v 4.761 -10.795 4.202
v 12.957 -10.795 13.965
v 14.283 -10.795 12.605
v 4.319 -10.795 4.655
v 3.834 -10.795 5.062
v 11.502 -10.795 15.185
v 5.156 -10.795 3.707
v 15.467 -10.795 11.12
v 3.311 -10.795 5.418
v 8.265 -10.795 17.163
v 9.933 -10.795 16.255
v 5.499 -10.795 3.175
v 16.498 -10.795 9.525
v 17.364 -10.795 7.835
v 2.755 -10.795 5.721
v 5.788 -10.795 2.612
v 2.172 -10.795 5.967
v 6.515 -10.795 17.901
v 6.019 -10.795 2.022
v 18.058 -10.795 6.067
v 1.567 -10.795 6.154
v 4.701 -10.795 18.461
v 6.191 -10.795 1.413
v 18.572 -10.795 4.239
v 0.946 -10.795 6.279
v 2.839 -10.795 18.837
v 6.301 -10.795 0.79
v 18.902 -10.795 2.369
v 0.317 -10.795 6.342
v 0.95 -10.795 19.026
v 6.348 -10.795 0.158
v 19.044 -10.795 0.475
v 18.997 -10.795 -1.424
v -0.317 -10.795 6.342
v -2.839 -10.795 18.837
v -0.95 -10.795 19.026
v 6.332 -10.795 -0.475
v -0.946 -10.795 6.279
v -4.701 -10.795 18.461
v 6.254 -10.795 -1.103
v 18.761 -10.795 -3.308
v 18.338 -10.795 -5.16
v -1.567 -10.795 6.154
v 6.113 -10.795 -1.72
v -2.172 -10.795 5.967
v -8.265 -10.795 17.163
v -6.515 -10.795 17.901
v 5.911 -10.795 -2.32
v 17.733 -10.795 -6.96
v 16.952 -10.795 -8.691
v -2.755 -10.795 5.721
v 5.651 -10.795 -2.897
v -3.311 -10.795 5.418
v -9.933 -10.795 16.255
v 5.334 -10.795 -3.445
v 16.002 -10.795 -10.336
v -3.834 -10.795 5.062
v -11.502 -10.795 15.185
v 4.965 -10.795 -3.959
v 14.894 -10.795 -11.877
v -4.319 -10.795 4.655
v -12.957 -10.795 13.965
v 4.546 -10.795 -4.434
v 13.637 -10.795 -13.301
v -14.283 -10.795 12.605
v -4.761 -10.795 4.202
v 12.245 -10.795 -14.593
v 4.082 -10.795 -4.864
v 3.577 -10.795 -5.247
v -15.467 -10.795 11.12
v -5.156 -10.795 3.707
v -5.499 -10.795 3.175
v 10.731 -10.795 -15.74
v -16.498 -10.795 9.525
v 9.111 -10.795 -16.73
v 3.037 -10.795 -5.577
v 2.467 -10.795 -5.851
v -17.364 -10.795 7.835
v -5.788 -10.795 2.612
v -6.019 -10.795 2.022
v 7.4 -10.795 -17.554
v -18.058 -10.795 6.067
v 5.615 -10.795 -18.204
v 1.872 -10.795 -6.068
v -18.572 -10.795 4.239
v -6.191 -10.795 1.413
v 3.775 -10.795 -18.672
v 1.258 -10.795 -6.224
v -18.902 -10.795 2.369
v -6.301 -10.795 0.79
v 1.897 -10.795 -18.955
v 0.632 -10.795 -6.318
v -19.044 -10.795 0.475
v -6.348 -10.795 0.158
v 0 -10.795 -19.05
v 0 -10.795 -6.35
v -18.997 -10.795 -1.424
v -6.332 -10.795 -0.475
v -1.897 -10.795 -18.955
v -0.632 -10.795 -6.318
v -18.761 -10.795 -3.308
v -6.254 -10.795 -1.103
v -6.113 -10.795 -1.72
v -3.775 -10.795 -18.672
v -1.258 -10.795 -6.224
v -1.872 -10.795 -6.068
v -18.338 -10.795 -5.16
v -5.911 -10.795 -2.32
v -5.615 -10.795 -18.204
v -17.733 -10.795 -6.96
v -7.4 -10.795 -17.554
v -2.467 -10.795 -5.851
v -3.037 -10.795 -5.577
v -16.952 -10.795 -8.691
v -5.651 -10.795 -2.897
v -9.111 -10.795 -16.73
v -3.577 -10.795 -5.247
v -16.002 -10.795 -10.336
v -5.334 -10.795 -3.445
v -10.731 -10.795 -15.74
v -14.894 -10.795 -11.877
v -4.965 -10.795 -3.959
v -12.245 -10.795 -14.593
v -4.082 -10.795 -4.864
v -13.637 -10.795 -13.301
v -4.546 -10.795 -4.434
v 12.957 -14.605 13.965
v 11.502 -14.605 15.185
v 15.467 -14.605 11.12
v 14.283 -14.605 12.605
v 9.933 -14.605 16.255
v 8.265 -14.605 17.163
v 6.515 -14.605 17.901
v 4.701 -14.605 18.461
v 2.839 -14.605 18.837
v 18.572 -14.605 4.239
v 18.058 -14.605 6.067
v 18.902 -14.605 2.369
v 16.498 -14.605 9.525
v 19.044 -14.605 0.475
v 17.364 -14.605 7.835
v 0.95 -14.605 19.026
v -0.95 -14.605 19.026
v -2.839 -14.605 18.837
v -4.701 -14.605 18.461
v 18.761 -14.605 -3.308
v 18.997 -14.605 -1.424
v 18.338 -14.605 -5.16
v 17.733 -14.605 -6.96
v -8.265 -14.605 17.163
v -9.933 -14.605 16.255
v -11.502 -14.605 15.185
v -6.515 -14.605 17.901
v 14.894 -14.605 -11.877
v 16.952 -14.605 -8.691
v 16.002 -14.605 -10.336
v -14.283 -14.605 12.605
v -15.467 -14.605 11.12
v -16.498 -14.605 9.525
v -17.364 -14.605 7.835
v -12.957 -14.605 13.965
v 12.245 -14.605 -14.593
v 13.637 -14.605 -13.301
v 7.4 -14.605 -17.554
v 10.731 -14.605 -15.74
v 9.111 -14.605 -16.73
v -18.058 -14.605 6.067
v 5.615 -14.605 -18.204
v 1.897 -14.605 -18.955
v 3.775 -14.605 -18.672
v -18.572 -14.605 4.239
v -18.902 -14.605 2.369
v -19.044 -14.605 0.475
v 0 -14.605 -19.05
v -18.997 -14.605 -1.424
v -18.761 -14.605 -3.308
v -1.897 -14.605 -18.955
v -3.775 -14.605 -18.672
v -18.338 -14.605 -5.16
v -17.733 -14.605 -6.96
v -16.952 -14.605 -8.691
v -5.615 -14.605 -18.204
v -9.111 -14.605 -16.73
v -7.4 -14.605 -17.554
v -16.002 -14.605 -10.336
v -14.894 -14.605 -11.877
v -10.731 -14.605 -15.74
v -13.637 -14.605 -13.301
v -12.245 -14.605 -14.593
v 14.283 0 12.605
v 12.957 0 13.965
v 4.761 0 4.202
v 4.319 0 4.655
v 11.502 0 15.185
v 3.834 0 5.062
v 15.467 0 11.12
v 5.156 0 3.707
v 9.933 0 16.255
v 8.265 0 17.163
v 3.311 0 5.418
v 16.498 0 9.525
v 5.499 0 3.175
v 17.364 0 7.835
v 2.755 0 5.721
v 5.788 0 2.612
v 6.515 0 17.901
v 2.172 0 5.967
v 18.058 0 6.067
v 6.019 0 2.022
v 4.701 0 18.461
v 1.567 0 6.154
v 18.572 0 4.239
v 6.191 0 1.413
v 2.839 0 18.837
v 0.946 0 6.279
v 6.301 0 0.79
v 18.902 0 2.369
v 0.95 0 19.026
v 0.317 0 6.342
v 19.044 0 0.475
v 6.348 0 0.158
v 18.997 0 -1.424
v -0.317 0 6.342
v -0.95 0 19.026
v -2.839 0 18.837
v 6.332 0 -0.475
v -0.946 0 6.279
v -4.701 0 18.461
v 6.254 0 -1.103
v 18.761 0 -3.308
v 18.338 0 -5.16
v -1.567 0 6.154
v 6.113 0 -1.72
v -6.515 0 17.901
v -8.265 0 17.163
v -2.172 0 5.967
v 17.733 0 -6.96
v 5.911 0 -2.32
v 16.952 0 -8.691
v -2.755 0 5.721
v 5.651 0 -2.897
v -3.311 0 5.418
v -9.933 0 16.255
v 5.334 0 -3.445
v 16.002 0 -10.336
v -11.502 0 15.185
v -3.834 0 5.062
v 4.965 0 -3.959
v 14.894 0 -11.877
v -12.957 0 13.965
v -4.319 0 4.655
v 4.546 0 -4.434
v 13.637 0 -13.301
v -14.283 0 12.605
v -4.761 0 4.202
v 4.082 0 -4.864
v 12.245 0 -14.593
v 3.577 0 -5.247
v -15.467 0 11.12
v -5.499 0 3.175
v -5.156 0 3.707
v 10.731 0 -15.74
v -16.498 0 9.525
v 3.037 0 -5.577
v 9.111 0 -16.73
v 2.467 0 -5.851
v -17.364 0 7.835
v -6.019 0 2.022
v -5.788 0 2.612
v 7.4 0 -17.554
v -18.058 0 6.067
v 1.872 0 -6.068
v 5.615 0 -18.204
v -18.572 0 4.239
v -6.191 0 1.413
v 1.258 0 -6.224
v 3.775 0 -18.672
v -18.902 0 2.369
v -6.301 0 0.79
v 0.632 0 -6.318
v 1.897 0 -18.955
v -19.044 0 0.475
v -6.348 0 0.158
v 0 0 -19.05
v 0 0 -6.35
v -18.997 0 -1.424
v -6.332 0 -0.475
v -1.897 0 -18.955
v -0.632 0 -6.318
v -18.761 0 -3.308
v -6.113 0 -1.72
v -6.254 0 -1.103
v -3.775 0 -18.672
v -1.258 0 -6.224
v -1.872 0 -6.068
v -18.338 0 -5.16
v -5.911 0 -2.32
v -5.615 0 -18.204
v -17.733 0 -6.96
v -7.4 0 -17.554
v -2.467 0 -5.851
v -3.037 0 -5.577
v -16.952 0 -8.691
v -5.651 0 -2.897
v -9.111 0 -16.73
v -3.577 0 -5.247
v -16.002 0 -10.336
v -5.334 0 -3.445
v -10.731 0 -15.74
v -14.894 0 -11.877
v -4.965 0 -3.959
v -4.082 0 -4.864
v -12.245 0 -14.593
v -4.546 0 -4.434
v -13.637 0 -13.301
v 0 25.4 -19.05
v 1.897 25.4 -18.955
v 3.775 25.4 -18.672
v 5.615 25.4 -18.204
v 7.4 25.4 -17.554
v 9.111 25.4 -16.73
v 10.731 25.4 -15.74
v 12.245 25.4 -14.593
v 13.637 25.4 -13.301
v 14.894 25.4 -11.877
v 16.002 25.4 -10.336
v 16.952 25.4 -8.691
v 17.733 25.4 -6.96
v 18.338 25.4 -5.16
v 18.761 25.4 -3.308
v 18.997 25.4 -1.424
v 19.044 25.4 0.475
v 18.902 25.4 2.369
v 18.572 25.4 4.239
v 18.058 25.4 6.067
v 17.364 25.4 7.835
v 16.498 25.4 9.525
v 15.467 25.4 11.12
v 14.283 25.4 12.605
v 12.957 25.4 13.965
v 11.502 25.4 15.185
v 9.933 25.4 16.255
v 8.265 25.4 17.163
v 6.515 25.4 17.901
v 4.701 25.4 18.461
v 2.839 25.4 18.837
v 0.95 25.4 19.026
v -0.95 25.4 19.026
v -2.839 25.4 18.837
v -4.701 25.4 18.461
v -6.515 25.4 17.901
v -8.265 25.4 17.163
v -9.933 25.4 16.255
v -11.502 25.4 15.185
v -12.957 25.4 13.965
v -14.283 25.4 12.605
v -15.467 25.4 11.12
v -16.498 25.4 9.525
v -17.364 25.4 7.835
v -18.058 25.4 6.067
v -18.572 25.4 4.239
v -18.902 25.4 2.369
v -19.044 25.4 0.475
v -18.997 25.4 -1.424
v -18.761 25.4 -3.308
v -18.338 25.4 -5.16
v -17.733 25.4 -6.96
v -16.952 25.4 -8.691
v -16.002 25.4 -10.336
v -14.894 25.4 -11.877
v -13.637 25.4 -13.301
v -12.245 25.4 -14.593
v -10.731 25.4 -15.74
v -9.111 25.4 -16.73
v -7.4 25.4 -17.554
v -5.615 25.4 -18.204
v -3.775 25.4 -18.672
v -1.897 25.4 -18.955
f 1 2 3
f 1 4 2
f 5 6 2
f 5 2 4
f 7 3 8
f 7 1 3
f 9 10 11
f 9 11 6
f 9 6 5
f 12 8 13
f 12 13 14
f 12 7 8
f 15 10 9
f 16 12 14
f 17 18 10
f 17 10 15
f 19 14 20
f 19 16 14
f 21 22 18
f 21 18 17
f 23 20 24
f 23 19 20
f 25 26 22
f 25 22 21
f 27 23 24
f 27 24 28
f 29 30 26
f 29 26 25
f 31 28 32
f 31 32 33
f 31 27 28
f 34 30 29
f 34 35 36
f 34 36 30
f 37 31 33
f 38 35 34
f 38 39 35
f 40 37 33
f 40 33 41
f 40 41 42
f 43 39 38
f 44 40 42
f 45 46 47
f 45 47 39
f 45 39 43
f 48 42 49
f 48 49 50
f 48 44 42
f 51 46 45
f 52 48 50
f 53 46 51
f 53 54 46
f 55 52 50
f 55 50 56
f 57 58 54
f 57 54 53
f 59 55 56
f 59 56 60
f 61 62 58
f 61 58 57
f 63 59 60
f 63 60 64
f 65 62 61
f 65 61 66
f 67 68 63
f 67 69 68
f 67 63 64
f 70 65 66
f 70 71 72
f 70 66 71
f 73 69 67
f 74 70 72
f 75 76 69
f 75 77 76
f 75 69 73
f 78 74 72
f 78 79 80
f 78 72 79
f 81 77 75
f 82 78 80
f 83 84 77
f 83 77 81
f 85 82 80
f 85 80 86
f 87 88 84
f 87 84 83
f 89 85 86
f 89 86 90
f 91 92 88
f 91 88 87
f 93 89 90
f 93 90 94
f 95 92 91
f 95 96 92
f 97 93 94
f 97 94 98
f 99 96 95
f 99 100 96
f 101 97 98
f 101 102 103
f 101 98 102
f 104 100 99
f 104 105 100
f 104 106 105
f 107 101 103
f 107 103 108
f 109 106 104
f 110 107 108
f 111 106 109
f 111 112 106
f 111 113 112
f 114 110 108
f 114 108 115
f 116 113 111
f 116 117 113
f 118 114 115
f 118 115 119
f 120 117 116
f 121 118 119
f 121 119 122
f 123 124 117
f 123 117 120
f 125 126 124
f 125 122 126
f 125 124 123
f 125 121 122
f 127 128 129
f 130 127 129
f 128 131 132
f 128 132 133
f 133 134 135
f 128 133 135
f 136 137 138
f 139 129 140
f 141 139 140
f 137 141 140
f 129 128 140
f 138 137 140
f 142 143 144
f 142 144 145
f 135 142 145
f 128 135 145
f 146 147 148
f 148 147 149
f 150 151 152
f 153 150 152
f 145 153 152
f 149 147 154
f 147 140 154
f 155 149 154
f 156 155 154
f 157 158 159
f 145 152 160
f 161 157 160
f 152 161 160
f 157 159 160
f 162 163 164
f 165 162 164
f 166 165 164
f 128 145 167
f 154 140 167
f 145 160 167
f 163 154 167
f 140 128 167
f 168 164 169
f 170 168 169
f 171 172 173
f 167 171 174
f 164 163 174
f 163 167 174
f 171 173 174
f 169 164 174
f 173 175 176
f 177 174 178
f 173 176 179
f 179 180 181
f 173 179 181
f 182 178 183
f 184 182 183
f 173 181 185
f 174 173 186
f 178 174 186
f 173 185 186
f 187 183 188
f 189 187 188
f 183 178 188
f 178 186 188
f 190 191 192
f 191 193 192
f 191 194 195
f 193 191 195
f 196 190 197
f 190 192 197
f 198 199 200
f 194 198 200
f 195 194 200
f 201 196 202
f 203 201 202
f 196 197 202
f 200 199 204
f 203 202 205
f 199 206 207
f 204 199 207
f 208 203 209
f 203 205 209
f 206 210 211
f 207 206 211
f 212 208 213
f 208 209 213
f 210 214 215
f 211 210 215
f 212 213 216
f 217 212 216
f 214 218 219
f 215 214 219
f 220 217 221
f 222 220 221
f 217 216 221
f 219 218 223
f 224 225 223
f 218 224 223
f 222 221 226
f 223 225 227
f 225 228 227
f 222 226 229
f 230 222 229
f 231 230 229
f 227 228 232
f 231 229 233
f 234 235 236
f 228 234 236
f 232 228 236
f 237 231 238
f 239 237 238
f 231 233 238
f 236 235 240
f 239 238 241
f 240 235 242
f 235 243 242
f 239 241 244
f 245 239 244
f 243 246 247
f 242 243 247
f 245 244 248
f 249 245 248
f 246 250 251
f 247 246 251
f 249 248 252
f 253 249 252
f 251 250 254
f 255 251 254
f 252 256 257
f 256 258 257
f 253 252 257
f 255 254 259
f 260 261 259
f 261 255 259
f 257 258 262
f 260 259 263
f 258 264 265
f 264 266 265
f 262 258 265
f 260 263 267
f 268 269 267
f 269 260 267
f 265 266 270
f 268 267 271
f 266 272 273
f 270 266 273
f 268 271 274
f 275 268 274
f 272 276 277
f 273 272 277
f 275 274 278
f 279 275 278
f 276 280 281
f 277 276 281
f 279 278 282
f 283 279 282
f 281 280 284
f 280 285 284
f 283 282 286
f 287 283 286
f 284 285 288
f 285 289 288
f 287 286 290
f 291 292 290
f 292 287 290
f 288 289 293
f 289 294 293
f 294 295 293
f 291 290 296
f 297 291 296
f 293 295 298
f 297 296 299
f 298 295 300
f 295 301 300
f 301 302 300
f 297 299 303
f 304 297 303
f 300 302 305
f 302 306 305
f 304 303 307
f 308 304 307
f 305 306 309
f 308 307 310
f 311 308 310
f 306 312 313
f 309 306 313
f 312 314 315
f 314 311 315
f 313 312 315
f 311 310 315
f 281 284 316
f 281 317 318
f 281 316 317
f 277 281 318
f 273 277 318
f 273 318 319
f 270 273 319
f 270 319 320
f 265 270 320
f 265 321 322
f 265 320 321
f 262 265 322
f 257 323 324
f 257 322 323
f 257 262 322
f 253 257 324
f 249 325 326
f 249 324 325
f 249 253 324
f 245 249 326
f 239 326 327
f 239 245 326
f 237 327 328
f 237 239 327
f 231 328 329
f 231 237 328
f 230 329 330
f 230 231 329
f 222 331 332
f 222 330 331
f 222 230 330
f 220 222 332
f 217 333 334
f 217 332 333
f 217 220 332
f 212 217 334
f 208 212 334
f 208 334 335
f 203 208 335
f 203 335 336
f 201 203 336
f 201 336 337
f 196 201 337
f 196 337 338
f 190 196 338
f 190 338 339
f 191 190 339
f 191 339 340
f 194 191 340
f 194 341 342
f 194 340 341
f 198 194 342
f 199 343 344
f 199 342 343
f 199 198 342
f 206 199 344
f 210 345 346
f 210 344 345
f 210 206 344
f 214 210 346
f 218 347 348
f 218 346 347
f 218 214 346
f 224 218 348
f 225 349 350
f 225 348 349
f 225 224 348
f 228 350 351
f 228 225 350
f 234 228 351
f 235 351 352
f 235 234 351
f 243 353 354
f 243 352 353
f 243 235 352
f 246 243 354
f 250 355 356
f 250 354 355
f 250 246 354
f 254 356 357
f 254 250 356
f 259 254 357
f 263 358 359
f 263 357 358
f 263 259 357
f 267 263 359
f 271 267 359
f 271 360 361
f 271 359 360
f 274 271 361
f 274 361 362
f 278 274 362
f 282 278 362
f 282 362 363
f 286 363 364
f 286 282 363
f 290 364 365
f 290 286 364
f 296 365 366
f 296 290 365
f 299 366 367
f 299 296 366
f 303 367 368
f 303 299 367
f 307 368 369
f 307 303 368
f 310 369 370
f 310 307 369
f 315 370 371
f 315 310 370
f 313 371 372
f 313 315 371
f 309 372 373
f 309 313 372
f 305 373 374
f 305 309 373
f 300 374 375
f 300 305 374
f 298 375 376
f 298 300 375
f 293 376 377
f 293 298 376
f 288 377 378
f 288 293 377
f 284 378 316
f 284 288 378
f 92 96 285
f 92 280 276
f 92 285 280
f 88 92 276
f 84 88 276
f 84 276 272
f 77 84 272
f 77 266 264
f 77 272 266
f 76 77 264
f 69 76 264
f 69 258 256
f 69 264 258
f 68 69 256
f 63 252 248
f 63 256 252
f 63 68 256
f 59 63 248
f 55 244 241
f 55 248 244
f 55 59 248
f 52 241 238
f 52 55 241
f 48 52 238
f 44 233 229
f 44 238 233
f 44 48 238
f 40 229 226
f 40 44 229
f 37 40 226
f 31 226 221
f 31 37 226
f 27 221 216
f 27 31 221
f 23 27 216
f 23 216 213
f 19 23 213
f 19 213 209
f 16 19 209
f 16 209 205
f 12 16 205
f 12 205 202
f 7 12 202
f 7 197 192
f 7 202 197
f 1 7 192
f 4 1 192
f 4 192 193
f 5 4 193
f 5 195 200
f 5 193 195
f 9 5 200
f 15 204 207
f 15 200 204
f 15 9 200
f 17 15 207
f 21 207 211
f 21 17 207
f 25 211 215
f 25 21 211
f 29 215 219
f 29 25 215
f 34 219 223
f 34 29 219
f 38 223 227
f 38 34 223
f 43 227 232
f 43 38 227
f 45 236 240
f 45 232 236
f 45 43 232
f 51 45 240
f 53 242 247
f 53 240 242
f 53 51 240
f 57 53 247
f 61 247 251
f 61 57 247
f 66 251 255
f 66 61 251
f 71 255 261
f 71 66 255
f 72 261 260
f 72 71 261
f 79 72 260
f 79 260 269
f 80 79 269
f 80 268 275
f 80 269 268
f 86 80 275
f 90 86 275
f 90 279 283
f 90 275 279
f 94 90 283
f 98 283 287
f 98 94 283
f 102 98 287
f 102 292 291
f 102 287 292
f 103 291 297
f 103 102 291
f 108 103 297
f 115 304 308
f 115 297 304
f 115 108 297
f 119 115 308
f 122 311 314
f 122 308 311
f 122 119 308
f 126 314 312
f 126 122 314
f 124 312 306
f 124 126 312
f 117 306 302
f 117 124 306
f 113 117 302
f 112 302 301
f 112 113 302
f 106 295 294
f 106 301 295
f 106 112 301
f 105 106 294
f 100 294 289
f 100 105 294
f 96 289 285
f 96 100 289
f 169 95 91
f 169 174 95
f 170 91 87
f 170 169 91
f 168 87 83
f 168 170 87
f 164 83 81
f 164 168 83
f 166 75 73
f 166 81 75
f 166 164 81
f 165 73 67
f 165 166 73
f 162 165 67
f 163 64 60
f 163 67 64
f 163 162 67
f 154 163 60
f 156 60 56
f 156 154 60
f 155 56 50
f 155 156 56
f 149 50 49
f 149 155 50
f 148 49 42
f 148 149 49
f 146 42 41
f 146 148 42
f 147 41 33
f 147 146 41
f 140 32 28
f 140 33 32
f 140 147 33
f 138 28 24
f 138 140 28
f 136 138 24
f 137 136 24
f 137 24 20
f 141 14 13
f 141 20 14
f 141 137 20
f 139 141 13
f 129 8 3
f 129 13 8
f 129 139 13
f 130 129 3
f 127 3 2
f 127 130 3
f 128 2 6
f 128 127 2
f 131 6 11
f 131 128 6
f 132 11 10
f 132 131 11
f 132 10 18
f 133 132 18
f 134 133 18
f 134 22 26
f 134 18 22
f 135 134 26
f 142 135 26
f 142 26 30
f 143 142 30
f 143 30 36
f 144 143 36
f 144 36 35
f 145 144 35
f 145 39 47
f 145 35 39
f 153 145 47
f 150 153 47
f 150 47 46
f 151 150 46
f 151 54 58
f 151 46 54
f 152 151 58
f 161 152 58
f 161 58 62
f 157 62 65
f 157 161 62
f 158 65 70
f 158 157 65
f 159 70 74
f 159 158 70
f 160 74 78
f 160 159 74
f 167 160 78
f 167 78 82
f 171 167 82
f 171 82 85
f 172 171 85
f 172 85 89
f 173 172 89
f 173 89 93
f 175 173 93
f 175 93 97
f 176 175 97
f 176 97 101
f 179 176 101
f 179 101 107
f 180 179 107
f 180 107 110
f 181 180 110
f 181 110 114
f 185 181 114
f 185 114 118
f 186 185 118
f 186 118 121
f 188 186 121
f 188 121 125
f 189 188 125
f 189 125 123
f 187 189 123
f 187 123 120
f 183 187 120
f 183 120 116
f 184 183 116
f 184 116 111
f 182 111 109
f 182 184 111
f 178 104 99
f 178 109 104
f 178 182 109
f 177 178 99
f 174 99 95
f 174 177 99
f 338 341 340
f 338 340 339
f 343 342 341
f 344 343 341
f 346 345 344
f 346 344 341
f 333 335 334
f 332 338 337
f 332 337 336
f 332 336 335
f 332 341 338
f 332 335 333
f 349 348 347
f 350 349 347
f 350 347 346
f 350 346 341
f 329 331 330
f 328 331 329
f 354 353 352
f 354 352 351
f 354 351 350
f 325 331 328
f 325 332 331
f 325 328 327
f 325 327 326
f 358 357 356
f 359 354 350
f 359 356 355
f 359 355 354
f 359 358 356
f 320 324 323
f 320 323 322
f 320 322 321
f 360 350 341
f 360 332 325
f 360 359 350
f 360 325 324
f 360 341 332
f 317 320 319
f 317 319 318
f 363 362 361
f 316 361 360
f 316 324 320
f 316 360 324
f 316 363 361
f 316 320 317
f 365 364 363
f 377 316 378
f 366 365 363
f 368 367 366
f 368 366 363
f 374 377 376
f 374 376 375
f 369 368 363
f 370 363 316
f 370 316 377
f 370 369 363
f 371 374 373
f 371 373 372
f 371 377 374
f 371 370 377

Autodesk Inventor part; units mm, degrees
ref_plane "YZ Plane" through (0, 0, 0) normal (1, 0, 0) x (0, 1, 0)
ref_plane "XZ Plane" through (0, 0, 0) normal (0, 1, 0) x (-1, 0, 0)
ref_plane "XY Plane" through (0, 0, 0) normal (0, 0, 1) x (1, 0, 0)
sketch "Sketch1" plane through (0, 0, 0) normal (1, 0, 0) x (0, 1, 0)
  line L0 (-12.7, 6.35) -> (12.7, 6.35)
  line L1 (12.7, 6.35) -> (12.7, -6.35)
  line L2 (12.7, -6.35) -> (-12.7, -6.35)
  line L3 (-12.7, -6.35) -> (-12.7, 6.35)
  line L4 (-12.7, 6.35) -> (12.7, -6.35) construction
  line L5 (12.7, 6.35) -> (-12.7, -6.35) construction
  line L6 (-14.605, 19.05) -> (-10.795, 19.05)
  line L7 (-10.795, 19.05) -> (-10.795, -19.05)
  line L8 (-10.795, -19.05) -> (-14.605, -19.05)
  line L9 (-14.605, -19.05) -> (-14.605, 19.05)
  line L10 (-14.605, 19.05) -> (-10.795, -19.05) construction
  line L11 (-10.795, 19.05) -> (-14.605, -19.05) construction
  line L12 (0, 19.05) -> (25.4, 19.05)
  line L13 (25.4, 19.05) -> (25.4, -19.05)
  line L14 (25.4, -19.05) -> (0, -19.05)
  line L15 (0, -19.05) -> (0, 19.05)
  line L16 (0, 19.05) -> (25.4, -19.05) construction
  line L17 (25.4, 19.05) -> (0, -19.05) construction
  line L18 (-14.605, 0) -> (25.4, 0)
  point P0 (0, 0)
  point P1 (-12.7, 0)
  point P2 (12.7, 0)
  point P3 (-10.795, -6.35)
  point P4 (0, -6.35)
  dimension "d0" = 25.4
  dimension "d1" = 38.1
  dimension "d2" = 3.81
  dimension "d3" = 38.1
  dimension "d5" = 25.4
  dimension "d6" = 12.7
revolve "Revolution1" add sketch "Sketch1" angle 360 about axis through (0, -14.605, 0) along (0, 1, 0) contours L18 L7 L2 L3 | L3 L2 L7 L8 L9 L18 | L18 L15 L2 L7 | L18 L1 L2 L15 | L18 L13 L14 L15 L2 L1
sketch "Sketch2" plane through (0, 25.4, 0) normal (0, 1, 0) x (1, 0, 0)
  point P0 (0, 0)
properties part number "pallet"
